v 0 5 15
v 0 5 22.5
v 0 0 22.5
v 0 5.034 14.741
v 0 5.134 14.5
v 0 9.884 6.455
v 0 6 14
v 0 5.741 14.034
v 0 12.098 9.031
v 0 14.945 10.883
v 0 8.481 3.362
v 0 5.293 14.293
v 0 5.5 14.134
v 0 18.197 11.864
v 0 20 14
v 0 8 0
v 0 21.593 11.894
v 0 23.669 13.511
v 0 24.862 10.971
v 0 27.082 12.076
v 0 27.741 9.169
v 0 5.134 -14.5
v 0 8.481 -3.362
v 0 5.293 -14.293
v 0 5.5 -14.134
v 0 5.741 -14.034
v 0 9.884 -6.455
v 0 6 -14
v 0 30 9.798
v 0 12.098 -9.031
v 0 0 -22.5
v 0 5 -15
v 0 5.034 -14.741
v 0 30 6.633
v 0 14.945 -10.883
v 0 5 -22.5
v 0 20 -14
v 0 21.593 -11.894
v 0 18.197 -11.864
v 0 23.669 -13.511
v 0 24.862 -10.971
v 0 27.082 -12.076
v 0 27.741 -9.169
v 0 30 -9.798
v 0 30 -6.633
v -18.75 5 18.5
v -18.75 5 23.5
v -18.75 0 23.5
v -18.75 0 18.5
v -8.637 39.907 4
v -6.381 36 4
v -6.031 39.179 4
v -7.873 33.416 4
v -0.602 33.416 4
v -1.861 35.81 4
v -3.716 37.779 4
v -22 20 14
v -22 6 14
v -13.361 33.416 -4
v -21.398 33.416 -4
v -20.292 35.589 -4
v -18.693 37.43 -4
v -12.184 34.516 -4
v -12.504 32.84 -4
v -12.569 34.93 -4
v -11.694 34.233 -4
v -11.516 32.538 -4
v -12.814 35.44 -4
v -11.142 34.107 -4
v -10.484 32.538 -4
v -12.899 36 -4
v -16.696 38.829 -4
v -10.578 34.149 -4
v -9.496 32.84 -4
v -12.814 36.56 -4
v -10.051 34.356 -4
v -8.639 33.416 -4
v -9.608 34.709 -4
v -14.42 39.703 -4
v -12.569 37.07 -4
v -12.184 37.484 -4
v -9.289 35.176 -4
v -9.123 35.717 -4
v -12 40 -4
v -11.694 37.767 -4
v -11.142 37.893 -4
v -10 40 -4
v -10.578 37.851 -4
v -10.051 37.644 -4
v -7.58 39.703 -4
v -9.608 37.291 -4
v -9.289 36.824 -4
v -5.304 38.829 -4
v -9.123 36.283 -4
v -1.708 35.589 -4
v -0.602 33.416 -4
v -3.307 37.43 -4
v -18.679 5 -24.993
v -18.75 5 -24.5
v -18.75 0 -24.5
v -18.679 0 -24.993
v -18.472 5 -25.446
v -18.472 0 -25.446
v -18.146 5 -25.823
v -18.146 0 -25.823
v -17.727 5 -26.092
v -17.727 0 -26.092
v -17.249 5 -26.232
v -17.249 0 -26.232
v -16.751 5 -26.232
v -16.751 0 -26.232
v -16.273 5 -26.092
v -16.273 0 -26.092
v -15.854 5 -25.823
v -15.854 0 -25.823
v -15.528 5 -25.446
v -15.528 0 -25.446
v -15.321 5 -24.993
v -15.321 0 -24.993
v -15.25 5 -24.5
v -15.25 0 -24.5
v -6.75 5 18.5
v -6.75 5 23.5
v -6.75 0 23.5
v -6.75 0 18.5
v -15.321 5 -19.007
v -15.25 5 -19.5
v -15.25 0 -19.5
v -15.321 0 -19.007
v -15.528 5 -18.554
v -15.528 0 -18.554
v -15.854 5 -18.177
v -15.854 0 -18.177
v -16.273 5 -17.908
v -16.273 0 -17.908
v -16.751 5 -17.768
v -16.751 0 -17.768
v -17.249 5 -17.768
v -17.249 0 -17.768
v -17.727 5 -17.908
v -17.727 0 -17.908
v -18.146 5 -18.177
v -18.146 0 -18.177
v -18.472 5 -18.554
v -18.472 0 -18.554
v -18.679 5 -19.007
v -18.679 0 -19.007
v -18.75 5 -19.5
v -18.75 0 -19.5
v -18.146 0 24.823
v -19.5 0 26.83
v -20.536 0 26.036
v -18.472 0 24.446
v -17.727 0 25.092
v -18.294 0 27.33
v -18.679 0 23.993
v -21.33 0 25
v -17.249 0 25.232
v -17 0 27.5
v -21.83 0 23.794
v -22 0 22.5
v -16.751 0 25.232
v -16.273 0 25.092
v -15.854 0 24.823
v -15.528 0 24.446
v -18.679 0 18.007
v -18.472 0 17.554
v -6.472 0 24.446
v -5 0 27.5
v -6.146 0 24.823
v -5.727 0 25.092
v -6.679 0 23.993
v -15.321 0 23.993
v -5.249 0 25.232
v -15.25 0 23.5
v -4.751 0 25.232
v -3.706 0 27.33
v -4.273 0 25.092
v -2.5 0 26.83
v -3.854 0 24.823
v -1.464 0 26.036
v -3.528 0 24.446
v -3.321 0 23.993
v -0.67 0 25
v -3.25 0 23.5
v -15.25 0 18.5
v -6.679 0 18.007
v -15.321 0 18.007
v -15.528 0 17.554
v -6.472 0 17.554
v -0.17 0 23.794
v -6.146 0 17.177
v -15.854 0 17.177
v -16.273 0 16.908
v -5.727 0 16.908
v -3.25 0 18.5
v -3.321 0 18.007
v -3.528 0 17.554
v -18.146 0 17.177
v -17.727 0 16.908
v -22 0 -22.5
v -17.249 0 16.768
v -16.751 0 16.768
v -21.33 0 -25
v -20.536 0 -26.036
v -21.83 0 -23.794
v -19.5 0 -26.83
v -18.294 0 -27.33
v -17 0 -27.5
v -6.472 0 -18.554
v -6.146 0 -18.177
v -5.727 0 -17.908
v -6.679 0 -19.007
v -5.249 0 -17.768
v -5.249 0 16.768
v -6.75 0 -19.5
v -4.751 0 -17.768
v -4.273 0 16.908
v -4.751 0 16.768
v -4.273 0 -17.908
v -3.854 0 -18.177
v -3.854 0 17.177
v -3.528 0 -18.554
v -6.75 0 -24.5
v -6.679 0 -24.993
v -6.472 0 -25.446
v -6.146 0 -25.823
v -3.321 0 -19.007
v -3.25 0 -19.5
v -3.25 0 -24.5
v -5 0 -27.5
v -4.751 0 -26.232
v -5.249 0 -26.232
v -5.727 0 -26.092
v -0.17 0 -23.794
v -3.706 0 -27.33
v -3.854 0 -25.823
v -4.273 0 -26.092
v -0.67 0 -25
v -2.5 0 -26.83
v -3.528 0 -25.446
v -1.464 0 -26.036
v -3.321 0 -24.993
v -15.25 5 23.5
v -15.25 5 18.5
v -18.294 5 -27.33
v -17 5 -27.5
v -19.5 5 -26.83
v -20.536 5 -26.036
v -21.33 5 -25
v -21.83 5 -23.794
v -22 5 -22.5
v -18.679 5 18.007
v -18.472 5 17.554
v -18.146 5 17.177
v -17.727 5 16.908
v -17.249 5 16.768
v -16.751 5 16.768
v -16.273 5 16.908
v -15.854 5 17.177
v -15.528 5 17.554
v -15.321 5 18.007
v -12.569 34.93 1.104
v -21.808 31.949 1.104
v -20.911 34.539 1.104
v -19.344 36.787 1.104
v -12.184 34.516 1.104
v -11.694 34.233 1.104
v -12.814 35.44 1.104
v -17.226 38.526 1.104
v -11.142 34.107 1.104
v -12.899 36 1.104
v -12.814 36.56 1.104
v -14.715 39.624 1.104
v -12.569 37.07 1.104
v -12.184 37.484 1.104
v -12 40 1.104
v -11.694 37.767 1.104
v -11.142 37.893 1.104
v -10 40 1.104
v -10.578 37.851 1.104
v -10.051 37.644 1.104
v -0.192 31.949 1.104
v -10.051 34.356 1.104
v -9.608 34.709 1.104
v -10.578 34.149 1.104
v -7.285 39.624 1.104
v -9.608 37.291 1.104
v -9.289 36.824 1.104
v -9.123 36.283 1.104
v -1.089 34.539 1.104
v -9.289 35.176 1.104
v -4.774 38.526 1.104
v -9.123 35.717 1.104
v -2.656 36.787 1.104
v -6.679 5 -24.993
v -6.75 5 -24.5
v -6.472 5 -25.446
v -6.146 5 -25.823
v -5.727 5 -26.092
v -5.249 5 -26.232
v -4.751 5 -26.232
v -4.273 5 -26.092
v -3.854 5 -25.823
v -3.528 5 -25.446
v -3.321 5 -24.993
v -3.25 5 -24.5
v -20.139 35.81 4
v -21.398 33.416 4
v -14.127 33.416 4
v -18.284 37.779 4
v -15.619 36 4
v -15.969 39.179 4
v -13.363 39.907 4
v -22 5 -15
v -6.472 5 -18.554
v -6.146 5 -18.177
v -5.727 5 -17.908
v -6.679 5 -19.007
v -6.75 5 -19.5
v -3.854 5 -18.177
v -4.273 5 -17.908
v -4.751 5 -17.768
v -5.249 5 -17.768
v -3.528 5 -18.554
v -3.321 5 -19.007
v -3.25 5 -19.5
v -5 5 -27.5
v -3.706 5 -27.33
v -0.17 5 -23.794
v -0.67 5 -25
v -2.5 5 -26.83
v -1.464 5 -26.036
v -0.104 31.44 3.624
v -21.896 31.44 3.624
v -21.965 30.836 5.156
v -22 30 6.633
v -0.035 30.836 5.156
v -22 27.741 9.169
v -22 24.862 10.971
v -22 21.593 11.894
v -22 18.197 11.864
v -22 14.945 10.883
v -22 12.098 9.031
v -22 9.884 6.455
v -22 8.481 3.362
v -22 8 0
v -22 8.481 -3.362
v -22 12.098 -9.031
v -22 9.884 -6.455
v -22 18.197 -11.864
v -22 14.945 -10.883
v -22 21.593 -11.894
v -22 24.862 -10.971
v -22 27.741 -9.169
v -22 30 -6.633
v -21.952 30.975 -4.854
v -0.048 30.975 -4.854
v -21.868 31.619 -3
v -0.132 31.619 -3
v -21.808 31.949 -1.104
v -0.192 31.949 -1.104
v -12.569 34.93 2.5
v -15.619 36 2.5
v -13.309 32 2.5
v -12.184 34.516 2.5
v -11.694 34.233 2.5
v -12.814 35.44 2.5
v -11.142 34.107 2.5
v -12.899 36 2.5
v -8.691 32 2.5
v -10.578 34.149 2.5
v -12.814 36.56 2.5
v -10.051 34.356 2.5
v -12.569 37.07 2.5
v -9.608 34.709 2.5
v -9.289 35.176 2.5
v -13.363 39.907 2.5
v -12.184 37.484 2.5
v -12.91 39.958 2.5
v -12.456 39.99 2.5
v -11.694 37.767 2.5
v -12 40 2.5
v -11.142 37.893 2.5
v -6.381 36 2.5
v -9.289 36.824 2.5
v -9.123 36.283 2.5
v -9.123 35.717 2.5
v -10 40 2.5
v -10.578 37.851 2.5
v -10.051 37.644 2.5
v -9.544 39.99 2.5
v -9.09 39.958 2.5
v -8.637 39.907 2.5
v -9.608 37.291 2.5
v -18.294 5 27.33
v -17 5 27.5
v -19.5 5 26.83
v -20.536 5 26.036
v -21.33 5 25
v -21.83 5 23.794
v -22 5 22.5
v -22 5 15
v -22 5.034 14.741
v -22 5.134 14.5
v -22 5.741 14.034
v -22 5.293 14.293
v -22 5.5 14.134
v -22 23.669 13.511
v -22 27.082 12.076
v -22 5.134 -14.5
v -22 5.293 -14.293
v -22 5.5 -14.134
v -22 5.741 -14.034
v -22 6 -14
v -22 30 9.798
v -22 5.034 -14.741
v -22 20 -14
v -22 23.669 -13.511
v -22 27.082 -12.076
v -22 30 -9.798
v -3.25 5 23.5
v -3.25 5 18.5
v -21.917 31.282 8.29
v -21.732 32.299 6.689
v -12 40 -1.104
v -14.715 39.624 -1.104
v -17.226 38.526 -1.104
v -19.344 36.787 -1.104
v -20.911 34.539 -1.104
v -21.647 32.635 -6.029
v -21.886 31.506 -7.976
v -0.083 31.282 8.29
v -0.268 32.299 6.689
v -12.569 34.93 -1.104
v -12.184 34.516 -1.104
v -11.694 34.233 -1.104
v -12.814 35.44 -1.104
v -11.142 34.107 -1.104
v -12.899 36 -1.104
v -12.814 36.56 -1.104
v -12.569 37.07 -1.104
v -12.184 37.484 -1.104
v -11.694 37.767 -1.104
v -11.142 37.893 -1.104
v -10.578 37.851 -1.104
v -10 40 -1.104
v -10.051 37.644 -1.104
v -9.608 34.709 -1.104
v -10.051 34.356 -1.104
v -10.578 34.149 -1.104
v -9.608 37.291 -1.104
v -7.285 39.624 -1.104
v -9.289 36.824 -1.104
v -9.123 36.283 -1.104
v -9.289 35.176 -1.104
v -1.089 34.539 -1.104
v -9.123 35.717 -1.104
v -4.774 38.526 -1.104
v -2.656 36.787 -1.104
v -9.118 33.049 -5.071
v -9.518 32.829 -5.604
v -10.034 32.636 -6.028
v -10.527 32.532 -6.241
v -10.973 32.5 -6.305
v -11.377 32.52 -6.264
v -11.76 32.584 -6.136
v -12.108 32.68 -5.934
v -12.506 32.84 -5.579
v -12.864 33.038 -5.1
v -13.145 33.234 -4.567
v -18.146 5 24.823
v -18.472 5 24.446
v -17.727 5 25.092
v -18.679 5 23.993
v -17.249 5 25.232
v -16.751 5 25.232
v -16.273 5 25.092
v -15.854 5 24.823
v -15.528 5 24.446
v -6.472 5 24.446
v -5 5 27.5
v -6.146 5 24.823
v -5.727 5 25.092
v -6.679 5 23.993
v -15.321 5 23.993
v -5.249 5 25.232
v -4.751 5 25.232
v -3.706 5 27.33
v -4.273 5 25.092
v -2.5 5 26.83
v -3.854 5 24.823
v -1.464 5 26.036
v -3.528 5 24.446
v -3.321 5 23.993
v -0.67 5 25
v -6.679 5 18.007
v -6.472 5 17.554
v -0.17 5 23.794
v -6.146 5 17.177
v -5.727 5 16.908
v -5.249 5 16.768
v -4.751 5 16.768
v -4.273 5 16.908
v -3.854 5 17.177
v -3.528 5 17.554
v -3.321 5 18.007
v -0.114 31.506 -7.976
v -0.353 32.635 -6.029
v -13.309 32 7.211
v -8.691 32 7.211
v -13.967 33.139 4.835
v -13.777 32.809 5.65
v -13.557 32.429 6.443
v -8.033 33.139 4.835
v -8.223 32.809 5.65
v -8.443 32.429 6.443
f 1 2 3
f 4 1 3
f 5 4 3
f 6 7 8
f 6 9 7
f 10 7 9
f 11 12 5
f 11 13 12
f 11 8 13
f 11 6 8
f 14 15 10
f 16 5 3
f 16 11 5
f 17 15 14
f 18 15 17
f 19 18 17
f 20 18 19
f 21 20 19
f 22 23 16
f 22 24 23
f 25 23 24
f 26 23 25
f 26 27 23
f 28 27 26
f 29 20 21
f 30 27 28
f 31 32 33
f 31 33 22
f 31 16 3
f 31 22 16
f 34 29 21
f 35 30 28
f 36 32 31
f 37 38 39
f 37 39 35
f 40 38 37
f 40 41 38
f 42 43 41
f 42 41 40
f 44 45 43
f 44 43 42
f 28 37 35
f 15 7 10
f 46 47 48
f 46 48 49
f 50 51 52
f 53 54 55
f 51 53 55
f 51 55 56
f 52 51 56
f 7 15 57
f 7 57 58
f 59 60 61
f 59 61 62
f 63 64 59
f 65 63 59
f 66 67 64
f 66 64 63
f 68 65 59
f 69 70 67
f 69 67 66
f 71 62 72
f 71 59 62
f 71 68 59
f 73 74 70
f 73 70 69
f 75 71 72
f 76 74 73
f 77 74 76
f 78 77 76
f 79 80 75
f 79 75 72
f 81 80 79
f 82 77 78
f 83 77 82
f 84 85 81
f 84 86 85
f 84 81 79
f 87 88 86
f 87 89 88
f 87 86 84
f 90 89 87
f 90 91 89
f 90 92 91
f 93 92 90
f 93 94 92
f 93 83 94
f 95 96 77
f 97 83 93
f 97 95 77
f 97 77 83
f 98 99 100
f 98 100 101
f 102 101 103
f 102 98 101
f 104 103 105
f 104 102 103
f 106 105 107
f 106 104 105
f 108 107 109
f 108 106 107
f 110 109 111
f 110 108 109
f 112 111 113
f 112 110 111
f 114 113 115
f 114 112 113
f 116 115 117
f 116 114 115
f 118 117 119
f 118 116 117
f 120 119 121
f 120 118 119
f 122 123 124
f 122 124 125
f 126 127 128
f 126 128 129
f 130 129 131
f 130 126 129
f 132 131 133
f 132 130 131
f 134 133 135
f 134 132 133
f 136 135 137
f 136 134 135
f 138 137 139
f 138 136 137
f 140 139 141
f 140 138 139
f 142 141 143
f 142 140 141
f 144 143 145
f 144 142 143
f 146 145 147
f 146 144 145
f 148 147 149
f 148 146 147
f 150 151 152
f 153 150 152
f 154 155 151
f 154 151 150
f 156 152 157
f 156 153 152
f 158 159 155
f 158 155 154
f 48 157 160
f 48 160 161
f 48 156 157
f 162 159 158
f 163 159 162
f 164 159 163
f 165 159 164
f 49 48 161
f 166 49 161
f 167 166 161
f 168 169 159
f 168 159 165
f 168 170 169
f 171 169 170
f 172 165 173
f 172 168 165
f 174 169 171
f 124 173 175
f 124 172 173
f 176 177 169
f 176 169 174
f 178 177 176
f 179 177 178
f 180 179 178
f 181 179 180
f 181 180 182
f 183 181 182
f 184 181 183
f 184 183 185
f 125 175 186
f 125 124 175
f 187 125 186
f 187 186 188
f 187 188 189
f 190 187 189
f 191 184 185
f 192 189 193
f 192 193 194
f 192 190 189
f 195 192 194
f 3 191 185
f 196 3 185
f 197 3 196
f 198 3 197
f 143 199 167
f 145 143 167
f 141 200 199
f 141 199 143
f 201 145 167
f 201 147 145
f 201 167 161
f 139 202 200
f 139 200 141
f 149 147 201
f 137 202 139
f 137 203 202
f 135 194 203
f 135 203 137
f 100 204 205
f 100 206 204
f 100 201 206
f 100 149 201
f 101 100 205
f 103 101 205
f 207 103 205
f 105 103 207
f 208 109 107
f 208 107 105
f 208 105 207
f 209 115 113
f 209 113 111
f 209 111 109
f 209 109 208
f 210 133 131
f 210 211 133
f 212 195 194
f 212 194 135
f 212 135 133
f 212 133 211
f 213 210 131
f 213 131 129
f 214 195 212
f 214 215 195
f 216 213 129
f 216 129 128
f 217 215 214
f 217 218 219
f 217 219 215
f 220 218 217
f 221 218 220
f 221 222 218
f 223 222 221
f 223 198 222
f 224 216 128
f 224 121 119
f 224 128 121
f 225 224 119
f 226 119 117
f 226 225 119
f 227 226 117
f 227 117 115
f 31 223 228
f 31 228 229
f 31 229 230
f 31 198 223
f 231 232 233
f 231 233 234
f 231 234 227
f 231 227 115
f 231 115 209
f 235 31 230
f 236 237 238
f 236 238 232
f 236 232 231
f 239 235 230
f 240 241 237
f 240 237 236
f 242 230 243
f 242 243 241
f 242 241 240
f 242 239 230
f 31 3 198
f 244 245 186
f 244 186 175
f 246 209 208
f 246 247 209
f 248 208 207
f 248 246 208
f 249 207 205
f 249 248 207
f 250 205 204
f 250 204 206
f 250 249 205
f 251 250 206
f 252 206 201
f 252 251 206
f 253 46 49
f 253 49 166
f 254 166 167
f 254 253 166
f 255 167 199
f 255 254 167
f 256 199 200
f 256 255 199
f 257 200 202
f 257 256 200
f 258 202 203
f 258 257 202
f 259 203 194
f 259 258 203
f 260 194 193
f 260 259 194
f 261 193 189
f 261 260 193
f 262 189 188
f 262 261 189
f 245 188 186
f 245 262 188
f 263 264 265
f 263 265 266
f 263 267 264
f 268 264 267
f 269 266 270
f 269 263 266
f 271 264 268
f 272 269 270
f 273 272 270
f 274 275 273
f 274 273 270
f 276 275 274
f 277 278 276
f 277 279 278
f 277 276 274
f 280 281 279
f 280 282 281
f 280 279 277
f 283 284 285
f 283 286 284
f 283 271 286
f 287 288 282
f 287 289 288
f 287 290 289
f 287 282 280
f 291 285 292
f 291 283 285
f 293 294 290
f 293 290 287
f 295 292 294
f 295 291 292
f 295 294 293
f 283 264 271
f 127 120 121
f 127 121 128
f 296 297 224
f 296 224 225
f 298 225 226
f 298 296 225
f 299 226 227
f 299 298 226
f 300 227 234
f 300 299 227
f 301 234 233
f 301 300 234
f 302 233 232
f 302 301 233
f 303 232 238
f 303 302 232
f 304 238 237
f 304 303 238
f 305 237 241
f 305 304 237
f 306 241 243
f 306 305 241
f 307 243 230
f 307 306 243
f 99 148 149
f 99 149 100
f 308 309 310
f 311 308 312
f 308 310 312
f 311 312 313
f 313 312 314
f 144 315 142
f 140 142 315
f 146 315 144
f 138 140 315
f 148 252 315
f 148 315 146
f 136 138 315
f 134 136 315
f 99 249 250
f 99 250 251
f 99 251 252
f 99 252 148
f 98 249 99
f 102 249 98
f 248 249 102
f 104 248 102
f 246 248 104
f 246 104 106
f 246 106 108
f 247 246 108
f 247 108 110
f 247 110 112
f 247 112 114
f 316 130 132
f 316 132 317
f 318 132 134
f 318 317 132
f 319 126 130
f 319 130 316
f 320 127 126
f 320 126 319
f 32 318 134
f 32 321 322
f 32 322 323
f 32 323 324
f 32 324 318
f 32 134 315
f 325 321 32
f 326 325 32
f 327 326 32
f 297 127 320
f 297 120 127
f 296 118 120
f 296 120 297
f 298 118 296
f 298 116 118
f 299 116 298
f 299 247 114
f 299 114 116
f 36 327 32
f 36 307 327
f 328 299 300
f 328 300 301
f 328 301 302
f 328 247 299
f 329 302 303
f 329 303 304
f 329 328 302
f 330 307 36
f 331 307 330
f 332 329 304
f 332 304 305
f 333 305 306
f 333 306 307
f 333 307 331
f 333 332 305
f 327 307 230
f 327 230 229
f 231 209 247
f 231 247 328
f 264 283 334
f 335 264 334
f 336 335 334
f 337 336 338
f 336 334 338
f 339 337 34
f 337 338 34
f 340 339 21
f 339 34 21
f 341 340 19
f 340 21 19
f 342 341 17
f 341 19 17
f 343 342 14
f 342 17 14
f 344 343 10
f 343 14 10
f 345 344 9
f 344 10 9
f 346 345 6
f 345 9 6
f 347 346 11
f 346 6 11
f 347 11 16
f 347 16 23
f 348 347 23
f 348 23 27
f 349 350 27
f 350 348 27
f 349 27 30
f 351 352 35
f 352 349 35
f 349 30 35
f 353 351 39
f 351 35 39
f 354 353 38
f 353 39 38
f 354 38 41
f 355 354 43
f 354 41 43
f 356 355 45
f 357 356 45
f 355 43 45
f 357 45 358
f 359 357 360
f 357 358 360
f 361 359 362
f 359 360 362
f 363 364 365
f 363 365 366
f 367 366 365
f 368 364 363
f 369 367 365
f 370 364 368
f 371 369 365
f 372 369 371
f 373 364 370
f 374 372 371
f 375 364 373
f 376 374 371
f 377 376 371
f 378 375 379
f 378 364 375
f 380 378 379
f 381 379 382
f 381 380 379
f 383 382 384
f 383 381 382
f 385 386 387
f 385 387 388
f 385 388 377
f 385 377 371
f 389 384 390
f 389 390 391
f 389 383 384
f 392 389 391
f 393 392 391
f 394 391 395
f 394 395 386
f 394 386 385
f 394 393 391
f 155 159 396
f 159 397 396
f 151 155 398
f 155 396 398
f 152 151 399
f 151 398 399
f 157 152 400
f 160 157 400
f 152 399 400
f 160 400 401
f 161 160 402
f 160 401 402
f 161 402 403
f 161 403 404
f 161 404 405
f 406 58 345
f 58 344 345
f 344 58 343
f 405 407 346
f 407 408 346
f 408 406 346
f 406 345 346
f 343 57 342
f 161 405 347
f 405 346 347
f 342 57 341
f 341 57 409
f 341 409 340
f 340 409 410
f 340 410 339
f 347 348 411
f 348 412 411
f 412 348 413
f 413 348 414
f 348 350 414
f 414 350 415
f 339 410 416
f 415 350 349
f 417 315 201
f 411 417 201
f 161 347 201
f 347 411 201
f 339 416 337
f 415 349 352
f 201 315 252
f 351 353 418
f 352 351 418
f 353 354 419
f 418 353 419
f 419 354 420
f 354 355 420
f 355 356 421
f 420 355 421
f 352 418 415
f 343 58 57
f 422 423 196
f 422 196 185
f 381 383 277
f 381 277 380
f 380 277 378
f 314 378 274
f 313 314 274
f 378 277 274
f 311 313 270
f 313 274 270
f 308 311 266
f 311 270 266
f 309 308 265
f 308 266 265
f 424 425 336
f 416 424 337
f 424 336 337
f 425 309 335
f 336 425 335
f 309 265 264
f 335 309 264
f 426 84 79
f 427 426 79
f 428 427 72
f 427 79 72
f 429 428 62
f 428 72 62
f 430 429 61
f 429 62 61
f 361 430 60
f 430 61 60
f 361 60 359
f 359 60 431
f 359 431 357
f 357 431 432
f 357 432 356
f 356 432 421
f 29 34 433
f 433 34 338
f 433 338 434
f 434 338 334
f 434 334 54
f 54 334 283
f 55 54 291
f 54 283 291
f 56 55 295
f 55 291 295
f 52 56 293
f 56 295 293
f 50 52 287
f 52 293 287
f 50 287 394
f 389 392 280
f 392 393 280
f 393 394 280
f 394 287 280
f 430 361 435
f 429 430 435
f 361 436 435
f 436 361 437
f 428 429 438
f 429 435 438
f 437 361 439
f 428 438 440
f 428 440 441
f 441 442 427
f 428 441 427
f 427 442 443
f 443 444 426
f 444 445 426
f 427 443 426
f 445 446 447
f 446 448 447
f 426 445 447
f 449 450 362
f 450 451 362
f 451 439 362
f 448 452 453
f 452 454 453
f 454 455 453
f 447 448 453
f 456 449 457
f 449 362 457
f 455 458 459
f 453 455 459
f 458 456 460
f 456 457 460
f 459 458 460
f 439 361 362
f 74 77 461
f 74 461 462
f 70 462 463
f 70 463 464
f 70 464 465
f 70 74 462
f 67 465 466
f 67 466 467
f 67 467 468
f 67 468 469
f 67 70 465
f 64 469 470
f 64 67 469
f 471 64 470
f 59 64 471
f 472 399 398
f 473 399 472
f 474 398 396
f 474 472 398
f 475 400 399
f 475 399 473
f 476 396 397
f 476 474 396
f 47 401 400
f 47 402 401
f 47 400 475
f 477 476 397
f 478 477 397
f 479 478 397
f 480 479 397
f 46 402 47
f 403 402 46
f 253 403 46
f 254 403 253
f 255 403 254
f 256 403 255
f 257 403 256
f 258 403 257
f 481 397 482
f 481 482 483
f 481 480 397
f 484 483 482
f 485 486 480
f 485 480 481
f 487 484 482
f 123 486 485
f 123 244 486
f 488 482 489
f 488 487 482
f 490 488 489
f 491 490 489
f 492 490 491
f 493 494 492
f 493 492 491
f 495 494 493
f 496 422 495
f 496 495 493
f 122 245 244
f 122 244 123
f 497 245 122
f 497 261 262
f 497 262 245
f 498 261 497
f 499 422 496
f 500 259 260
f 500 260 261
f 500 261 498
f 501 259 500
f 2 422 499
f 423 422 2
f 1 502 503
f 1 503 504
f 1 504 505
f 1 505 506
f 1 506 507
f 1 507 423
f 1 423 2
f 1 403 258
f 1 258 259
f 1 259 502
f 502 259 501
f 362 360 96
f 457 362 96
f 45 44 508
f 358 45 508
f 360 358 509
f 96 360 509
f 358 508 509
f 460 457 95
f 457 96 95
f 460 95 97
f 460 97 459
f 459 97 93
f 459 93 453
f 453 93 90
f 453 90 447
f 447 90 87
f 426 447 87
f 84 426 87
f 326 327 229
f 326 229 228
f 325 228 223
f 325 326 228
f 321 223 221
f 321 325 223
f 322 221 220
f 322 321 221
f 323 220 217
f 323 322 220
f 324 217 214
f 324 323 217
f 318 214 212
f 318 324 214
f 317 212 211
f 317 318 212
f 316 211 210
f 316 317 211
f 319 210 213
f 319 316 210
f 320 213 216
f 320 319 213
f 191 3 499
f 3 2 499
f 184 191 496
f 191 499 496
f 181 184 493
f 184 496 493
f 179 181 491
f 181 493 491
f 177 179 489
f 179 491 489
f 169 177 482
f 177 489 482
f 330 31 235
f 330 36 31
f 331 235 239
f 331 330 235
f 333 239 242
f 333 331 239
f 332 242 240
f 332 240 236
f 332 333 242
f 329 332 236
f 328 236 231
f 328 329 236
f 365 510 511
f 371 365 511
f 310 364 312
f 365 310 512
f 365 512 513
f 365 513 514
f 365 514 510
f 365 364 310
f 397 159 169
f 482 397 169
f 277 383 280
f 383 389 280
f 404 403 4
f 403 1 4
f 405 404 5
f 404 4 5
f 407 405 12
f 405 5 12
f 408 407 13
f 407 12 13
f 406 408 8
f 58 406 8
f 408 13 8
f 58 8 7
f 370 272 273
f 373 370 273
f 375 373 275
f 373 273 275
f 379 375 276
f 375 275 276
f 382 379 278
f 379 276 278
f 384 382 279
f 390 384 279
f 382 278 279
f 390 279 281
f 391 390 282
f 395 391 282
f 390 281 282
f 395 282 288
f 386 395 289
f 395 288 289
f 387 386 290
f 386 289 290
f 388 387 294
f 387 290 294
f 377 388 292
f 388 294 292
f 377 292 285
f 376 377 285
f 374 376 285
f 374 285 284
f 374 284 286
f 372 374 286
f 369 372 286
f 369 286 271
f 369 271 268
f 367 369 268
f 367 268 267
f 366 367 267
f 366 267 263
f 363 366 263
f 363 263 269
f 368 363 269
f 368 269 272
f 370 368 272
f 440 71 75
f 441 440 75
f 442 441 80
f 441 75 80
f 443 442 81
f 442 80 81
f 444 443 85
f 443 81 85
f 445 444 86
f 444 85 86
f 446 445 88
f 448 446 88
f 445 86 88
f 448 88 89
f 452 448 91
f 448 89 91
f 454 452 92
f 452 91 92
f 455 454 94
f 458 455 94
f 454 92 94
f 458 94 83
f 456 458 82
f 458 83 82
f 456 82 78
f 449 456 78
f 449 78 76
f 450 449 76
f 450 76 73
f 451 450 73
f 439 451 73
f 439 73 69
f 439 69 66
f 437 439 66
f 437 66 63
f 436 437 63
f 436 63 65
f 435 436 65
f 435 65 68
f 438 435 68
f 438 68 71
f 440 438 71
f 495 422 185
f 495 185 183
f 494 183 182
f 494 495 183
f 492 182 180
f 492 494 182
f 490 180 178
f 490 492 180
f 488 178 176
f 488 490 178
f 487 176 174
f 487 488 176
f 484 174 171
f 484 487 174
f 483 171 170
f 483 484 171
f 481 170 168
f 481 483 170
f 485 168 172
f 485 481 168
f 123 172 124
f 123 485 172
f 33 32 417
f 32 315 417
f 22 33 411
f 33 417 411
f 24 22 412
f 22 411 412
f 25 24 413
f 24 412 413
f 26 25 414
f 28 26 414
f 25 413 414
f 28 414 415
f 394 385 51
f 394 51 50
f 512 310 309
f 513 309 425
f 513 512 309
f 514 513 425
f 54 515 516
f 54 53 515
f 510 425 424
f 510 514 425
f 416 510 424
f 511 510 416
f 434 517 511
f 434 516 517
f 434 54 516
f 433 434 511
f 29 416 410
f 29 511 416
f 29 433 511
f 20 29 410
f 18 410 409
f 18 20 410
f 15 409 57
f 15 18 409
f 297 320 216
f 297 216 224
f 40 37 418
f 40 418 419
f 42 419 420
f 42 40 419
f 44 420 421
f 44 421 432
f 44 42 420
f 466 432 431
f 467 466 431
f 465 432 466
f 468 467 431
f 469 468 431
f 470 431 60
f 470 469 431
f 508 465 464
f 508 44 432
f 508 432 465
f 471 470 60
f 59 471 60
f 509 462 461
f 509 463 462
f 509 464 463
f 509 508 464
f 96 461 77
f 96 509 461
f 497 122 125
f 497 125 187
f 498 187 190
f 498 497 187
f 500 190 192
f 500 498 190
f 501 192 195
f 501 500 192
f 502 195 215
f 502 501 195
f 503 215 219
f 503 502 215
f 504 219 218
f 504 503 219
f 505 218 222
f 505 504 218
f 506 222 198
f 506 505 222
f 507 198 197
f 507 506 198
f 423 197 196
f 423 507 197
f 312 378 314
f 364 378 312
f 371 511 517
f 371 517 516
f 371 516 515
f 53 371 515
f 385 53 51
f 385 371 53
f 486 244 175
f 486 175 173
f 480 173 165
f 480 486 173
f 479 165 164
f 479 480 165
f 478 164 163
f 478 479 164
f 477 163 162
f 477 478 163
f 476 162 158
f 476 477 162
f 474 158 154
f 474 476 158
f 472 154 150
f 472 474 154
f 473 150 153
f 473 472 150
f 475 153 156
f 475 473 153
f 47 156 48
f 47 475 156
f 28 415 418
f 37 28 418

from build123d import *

# Parameters (mm, degrees)
SKETCH1_W             = 22
SKETCH1_H             = 55
BASE_DEPTH            = 5
SKETCH2_R             = 12
MOTOR_SUPPORT_DEPTH   = 22
SKETCH3_W             = 8
SKETCH3_H             = 8
CLAMP_FLANGE_DEPTH    = 22
SKETCH4_W             = 2.208433096
SKETCH4_H             = 15
SLOT_DEPTH            = 35
F_6_CLEARANCE_HOLE1_D = 3.7973
HEX_CUT_DEPTH         = 56.463952257
HEX_CUT_DEPTH_BACK    = 1.5
SKETCH9_R             = 3.5
SCREW_HEAD_CUT_DEPTH  = 56.463952257
MOUNTING_SLOT_DEPTH   = 50.651284016
LPATTERN1_COUNT       = 2
LPATTERN1_PITCH       = 12
LPATTERN1_COUNT_DIR2  = 2
LPATTERN1_PITCH_DIR2  = 43
FILLET2_R             = 5
FILLET3_R             = 1
FILLET4_R             = 10


with BuildPart() as part:
    # Sketch1 → Base (new body)
    with BuildSketch(Plane(origin=(0, 0, 0), x_dir=(1, 0, 0), z_dir=(0, 1, 0))):
        with Locations((-11, 0)):
            Rectangle(SKETCH1_W, SKETCH1_H)
    extrude(amount=BASE_DEPTH)

    # Sketch2 → Motor Support (add)
    with BuildSketch(Plane(origin=(0, 0, 0), x_dir=(0, 0, -1), z_dir=(1, 0, 0))):
        with BuildLine():
            Line((-14, 20), (-14, 0))
            Line((-14, 0), (14, 0))
            Line((14, 0), (14, 20))
            ThreePointArc((14, 20), (0, 34), (-14, 20))
        make_face()
        with Locations((0, 20)):
            Circle(SKETCH2_R, mode=Mode.SUBTRACT)
    extrude(amount=-MOTOR_SUPPORT_DEPTH)

    # Sketch3 → Clamp Flange (add)
    with BuildSketch(Plane(origin=(0, 0, 0), x_dir=(0, 0, -1), z_dir=(1, 0, 0))):
        with Locations((0, 36)):
            Rectangle(SKETCH3_W, SKETCH3_H)
    extrude(amount=-CLAMP_FLANGE_DEPTH)

    # Sketch4 → Slot (cut)
    with BuildSketch(Plane(origin=(0, 0, 0), x_dir=(0, 0, -1), z_dir=(1, 0, 0))):
        with Locations((0, 33.5)):
            Rectangle(SKETCH4_W, SKETCH4_H)
    extrude(amount=-SLOT_DEPTH, mode=Mode.SUBTRACT)

    # #6 Clearance Hole1 (through all)
    with Locations(Plane.XY.offset(4)):
        with Locations((-11, 36)):
            Hole(F_6_CLEARANCE_HOLE1_D / 2)

    # Sketch7 → Hex-Cut (cut, two sides: drawn at the far end of the back side and taken through both)
    with BuildSketch(Plane.XY.offset(4).offset(-HEX_CUT_DEPTH_BACK)):
        Polygon((-8.690598923, 40), (-13.309401077, 40), (-15.618802154, 36), (-13.309401077, 32), (-8.690598923, 32), (-6.381197846, 36), align=None)
    extrude(amount=HEX_CUT_DEPTH + HEX_CUT_DEPTH_BACK, mode=Mode.SUBTRACT)

    # Sketch9 → Screw Head Cut (cut, through all)
    with BuildSketch(Plane(origin=(0, 0, -4), x_dir=(-1, 0, 0), z_dir=(0, 0, -1))):
        with Locations((11, 36)):
            Circle(SKETCH9_R)
    extrude(amount=SCREW_HEAD_CUT_DEPTH, mode=Mode.SUBTRACT)

    # Sketch8 → Mounting Slot (cut, through all)
    with BuildSketch(Plane(origin=(0, 5, 0), x_dir=(1, 0, 0), z_dir=(0, 1, 0))):
        with BuildLine():
            Line((-18.75, 19.5), (-18.75, 24.5))
            ThreePointArc((-18.75, 24.5), (-17, 26.25), (-15.25, 24.5))
            Line((-15.25, 24.5), (-15.25, 19.5))
            ThreePointArc((-15.25, 19.5), (-17, 17.75), (-18.75, 19.5))
        make_face()
    mounting_slot = extrude(amount=-MOUNTING_SLOT_DEPTH, mode=Mode.SUBTRACT)

    # LPattern1: Mounting Slot 2 × 2
    with Locations(*[(i * LPATTERN1_PITCH, 0, j * LPATTERN1_PITCH_DIR2) for i in range(LPATTERN1_COUNT) for j in range(LPATTERN1_COUNT_DIR2) if (i, j) != (0, 0)]):
        add(mounting_slot, mode=Mode.SUBTRACT)

    # Fillet2
    fillet2_edges = [part.edges().sort_by_distance(p)[0] for p in [
        (0, 2.5, 27.5),
        (-22, 2.5, 27.5),
        (-22, 2.5, -27.5),
        (0, 2.5, -27.5),
    ]]
    fillet(fillet2_edges, radius=FILLET2_R)

    # Fillet3
    fillet3_edges = [part.edges().sort_by_distance(p)[0] for p in [
        (-11, 5, -14),
        (-11, 5, 14),
    ]]
    fillet(fillet3_edges, radius=FILLET3_R)

    # Fillet4
    # the kernel refuses this fillet: 10 mm, written as the material it takes off along each edge
    with BuildSketch(Plane(origin=(0, 40, -29), x_dir=(0, -1, 0), z_dir=(0, 0, 1)), Plane(origin=(0, 40, -23.895783452), x_dir=(0, -1, 0), z_dir=(0, 0, 1))) as fillet4_piece_1:
        with BuildLine():
            CenterArc((FILLET4_R, -FILLET4_R), FILLET4_R, 90, 90)
            Line((0, -FILLET4_R), (0, 0))
            Line((0, 0), (FILLET4_R, 0))
        make_face()
    extrude(amount=52.895783452, mode=Mode.SUBTRACT)
    with BuildSketch(Plane(origin=(-22, 40, -29), x_dir=(0, -1, 0), z_dir=(0, 0, 1)), Plane(origin=(-22, 40, -23.895783452), x_dir=(0, -1, 0), z_dir=(0, 0, 1))) as fillet4_piece_2:
        with BuildLine():
            CenterArc((FILLET4_R, FILLET4_R), FILLET4_R, 180, 90)
            Line((0, FILLET4_R), (0, 0))
            Line((0, 0), (FILLET4_R, 0))
        make_face()
    extrude(amount=52.895783452, mode=Mode.SUBTRACT)


solid = part.part
